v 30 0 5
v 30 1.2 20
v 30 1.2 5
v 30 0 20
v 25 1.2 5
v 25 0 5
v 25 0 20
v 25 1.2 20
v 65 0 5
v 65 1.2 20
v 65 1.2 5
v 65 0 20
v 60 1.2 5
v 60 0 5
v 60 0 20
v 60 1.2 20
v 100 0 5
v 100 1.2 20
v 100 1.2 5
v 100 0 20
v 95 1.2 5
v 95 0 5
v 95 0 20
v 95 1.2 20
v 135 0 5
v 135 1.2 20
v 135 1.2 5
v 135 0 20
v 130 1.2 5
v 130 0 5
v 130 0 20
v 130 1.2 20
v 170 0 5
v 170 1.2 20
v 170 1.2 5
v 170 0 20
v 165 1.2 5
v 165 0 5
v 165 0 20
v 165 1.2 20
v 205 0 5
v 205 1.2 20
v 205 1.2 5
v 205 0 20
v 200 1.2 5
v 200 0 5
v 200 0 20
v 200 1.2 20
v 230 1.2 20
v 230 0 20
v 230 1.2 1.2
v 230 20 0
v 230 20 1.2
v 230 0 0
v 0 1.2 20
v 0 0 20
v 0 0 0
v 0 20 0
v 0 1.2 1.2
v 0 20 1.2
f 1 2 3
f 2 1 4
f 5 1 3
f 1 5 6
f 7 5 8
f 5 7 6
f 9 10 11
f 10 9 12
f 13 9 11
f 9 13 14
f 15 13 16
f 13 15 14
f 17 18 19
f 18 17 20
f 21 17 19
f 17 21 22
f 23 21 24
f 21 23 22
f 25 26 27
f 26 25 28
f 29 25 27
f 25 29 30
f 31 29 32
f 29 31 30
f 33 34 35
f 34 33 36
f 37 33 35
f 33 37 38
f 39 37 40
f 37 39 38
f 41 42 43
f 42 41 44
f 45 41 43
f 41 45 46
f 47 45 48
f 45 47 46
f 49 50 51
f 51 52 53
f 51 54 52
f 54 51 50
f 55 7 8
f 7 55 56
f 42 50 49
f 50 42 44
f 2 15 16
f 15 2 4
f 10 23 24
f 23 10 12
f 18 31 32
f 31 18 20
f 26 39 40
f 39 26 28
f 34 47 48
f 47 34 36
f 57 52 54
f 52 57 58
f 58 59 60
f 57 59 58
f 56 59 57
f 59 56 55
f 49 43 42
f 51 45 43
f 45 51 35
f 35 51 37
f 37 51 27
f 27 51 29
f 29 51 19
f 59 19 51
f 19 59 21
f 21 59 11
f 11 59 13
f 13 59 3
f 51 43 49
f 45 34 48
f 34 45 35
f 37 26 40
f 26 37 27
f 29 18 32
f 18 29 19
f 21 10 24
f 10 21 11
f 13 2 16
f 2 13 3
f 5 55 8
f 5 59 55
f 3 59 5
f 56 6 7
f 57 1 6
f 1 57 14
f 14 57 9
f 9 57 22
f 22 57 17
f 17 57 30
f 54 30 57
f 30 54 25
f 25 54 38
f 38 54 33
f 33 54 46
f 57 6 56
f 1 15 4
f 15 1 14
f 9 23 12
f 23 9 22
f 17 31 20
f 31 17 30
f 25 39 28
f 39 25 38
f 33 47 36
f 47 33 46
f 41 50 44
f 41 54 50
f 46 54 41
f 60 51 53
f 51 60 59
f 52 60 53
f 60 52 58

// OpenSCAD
b=230;
h=20;
d=1.2;
bund=5;
tandh=h-bund;
tandb=30;
hulb=5;
tandbb=tandb+hulb;
ntand=round(b/tandbb-1.5);
kant=(b-ntand*tandbb)/2;

cube([b,h,d]);
difference(){
cube([b,d,h]);
for (i =[0:ntand]){
    translate([i*(tandbb)+kant-hulb/2,-0.5,bund])
        cube([hulb,d+1,tandh+1]);
    }
}
